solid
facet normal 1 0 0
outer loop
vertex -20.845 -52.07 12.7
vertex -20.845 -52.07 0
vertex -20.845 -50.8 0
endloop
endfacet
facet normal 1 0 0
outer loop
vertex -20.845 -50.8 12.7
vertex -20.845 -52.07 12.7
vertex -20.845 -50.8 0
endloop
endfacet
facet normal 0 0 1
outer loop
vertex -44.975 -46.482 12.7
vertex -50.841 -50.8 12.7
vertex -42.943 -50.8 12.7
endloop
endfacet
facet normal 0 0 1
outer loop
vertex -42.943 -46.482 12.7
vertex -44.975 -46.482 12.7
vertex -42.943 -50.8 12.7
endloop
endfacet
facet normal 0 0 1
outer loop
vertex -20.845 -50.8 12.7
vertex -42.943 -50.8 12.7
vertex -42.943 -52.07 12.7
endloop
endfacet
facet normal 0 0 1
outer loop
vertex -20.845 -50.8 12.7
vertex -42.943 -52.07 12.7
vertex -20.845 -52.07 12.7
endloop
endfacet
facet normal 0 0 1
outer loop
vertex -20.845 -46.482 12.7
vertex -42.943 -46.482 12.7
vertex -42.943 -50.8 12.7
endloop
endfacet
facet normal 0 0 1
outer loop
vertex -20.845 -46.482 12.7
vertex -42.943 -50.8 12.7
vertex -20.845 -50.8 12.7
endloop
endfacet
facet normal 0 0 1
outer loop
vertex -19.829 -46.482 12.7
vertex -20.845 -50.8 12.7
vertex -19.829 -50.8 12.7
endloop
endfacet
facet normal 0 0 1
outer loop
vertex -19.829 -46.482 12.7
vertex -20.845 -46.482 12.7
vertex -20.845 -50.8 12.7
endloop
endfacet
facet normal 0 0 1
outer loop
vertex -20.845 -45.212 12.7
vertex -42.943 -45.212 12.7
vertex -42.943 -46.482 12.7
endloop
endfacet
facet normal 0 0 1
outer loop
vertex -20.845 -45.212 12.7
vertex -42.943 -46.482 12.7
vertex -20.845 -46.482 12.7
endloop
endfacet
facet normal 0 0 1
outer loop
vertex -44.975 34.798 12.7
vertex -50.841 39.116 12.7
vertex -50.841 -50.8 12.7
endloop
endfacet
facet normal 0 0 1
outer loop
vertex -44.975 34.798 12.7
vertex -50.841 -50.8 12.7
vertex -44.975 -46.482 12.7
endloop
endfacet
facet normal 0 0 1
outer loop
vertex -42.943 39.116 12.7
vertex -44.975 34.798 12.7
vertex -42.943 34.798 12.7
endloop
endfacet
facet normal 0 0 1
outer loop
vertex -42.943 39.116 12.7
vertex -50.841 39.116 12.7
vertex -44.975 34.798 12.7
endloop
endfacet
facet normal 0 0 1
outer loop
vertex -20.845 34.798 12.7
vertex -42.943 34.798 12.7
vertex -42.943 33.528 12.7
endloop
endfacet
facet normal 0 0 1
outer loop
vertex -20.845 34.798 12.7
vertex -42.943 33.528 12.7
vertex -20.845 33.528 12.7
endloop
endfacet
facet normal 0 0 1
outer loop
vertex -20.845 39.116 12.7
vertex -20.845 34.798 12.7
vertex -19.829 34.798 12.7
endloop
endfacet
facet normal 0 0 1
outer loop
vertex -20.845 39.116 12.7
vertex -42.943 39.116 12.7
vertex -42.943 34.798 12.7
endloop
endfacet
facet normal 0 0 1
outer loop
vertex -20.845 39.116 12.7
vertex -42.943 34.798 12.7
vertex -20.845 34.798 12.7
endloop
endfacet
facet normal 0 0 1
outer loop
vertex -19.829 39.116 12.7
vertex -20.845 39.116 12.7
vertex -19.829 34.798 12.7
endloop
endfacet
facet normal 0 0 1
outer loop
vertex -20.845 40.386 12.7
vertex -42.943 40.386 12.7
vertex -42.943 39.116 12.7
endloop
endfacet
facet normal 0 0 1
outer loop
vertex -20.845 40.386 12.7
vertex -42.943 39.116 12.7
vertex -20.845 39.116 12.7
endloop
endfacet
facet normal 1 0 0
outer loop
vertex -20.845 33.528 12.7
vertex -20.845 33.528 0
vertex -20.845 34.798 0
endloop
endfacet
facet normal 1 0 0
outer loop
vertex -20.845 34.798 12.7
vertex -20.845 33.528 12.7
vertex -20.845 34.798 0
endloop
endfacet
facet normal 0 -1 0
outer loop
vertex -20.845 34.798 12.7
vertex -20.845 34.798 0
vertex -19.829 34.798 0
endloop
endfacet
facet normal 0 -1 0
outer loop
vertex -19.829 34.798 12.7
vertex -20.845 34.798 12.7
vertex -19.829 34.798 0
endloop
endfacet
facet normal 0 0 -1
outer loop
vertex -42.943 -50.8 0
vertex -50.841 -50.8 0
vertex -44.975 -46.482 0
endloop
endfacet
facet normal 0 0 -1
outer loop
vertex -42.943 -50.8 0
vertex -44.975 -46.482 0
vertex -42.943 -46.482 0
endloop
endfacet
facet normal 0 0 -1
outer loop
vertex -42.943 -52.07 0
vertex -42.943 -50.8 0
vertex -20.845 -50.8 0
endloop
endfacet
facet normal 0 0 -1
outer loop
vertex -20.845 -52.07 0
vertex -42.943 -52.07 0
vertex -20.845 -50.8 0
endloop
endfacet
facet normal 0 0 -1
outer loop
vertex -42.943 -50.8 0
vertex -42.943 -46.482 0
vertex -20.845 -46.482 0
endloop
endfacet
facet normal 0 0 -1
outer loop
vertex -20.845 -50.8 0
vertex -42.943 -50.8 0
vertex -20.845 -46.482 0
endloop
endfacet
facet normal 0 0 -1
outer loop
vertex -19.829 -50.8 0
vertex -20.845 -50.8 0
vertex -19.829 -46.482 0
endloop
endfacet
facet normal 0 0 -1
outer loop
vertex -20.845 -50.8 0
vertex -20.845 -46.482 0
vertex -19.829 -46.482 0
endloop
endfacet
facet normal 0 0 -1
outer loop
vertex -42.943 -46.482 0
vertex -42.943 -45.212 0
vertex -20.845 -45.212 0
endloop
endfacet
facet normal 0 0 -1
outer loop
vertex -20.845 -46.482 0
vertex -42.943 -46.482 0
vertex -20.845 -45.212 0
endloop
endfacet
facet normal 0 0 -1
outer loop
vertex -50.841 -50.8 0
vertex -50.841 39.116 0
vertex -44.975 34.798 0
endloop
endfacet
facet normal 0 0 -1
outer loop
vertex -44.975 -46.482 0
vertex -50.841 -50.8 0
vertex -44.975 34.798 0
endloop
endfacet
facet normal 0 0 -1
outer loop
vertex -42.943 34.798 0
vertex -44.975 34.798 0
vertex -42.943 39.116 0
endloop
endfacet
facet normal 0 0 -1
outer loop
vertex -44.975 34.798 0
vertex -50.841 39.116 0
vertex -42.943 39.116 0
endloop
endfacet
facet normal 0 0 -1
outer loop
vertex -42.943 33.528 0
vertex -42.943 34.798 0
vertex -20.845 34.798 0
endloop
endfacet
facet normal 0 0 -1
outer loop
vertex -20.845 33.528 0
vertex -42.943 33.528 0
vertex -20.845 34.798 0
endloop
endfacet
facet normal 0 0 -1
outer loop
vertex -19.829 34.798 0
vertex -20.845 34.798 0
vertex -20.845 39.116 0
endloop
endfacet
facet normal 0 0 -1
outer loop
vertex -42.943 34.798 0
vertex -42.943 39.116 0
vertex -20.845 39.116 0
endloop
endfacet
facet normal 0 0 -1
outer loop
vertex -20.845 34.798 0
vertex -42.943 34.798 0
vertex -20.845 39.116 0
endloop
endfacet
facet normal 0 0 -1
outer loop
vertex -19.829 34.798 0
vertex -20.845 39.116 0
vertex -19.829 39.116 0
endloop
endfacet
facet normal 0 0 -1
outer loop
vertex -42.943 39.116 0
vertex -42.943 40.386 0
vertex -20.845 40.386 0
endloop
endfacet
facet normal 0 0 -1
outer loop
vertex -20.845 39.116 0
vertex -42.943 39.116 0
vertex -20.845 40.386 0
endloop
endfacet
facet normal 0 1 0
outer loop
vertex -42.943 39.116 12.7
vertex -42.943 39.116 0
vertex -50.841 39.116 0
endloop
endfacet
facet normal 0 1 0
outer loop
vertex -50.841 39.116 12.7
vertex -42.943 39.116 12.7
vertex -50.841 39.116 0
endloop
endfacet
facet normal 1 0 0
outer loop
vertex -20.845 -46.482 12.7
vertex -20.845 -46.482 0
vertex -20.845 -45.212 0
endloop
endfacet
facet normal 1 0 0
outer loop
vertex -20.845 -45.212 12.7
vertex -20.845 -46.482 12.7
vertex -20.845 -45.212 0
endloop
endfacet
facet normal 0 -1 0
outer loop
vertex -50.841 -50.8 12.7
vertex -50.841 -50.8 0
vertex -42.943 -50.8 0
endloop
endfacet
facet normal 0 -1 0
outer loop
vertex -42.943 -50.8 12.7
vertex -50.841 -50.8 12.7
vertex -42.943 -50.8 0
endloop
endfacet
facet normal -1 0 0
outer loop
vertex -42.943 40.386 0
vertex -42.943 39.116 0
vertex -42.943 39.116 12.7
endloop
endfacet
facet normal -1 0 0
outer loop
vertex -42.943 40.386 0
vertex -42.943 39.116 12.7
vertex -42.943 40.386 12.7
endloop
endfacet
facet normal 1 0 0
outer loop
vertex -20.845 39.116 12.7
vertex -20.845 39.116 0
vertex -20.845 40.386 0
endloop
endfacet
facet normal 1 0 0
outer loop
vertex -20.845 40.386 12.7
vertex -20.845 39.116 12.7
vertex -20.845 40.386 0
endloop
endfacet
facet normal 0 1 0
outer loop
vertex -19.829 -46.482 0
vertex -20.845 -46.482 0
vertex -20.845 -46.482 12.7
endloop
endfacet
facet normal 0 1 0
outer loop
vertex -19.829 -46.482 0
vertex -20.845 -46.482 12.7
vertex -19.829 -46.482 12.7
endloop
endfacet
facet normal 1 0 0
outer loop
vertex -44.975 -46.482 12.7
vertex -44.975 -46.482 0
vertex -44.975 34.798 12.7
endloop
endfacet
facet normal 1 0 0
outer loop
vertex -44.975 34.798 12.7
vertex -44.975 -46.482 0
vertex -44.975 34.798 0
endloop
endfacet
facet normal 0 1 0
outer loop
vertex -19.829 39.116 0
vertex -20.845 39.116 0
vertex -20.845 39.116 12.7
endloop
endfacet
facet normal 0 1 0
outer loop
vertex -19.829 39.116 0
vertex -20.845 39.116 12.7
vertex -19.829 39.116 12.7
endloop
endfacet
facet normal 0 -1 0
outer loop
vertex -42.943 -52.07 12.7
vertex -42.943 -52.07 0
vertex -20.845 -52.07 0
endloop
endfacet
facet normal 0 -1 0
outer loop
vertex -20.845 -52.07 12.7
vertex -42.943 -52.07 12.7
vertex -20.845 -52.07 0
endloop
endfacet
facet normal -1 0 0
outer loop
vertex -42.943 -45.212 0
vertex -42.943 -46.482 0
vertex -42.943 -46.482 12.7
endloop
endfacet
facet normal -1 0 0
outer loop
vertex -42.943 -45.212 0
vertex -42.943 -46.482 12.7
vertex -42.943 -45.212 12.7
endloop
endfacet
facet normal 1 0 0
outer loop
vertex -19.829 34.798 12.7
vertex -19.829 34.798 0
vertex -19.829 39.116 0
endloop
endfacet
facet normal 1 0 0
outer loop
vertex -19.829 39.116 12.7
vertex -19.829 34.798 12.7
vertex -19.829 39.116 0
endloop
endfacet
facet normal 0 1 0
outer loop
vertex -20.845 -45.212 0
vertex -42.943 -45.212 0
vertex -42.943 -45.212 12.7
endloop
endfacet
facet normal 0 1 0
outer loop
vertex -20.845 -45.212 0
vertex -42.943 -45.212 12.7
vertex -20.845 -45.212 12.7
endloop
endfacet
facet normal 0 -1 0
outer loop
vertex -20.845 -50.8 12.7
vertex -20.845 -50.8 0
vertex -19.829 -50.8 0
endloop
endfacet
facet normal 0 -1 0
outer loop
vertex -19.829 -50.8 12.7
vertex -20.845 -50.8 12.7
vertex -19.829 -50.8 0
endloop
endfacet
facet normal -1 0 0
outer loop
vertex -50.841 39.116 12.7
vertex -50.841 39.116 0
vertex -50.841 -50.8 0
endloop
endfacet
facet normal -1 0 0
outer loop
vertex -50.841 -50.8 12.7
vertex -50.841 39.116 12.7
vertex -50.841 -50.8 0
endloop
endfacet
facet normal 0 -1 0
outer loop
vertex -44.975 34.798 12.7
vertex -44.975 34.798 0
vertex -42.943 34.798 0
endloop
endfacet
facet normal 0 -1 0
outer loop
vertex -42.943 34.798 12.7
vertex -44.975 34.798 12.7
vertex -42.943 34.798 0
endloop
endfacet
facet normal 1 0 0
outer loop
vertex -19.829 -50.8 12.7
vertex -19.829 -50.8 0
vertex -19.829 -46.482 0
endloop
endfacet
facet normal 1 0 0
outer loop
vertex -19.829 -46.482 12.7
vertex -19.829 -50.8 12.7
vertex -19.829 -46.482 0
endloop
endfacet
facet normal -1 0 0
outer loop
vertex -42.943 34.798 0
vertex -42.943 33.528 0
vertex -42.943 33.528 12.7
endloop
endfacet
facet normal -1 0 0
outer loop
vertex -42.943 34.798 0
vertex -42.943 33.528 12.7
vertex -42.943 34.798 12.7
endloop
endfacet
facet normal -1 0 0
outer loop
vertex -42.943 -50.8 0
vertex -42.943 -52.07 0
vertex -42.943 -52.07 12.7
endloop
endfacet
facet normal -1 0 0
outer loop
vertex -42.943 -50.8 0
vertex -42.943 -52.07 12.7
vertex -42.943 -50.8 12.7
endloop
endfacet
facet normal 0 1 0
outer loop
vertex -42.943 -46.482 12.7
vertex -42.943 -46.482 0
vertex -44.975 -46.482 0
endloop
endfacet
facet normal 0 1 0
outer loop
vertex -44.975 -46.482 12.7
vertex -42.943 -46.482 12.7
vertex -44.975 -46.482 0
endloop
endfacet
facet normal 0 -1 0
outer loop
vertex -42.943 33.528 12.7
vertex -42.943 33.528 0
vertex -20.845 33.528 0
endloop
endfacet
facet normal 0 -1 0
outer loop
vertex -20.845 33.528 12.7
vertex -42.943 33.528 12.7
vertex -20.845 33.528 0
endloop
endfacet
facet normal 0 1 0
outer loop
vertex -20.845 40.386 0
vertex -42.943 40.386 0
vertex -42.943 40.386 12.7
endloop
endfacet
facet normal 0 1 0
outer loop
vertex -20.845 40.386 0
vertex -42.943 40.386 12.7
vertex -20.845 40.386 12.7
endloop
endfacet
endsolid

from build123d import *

# Parameters (mm, degrees)
F0_W     = 22.098
F0_H     = 4.318
F0_W_2   = 2.032
F0_H_2   = 1.27
F0_W_3   = 1.016
F1_DEPTH = 12.7
F2_DEPTH = 12.7


# Not quite as in the source:
# - a feature names something its author has since deleted; it is built from what else it names


with BuildPart() as f1:
    # F0 (on Top) → F1 (new body)
    with BuildSketch(Plane.XY):
        with Locations((-31.8938936177, -48.641)):
            Rectangle(F0_W, F0_H)
        with Locations((-43.9588936177, -48.641)):
            Rectangle(F0_W_2, F0_H)
        with Locations((-31.8938936177, -51.435)):
            Rectangle(F0_W, F0_H_2)
        with Locations((-31.8938936177, -45.847)):
            Rectangle(F0_W, F0_H_2)
        with Locations((-20.3368936177, -48.641)):
            Rectangle(F0_W_3, F0_H)
        Polygon((-50.8410629748, -50.8), (-44.9748936177, -50.8), (-44.9748936177, -46.482), (-44.9748936177, 34.798), (-44.9748936177, 39.116), (-50.8410629748, 39.116), align=None)
    extrude(amount=F1_DEPTH)

    # F0 (on Top) → F2 (join)
    with BuildSketch(Plane.XY):
        with Locations((-31.8938936177, 36.957)):
            Rectangle(F0_W, F0_H)
        with Locations((-43.9588936177, 36.957)):
            Rectangle(F0_W_2, F0_H)
        with Locations((-31.8938936177, 34.163)):
            Rectangle(F0_W, F0_H_2)
        with Locations((-31.8938936177, 39.751)):
            Rectangle(F0_W, F0_H_2)
        with Locations((-20.3368936177, 36.957)):
            Rectangle(F0_W_3, F0_H)
    extrude(amount=F2_DEPTH)


solid = f1.part
